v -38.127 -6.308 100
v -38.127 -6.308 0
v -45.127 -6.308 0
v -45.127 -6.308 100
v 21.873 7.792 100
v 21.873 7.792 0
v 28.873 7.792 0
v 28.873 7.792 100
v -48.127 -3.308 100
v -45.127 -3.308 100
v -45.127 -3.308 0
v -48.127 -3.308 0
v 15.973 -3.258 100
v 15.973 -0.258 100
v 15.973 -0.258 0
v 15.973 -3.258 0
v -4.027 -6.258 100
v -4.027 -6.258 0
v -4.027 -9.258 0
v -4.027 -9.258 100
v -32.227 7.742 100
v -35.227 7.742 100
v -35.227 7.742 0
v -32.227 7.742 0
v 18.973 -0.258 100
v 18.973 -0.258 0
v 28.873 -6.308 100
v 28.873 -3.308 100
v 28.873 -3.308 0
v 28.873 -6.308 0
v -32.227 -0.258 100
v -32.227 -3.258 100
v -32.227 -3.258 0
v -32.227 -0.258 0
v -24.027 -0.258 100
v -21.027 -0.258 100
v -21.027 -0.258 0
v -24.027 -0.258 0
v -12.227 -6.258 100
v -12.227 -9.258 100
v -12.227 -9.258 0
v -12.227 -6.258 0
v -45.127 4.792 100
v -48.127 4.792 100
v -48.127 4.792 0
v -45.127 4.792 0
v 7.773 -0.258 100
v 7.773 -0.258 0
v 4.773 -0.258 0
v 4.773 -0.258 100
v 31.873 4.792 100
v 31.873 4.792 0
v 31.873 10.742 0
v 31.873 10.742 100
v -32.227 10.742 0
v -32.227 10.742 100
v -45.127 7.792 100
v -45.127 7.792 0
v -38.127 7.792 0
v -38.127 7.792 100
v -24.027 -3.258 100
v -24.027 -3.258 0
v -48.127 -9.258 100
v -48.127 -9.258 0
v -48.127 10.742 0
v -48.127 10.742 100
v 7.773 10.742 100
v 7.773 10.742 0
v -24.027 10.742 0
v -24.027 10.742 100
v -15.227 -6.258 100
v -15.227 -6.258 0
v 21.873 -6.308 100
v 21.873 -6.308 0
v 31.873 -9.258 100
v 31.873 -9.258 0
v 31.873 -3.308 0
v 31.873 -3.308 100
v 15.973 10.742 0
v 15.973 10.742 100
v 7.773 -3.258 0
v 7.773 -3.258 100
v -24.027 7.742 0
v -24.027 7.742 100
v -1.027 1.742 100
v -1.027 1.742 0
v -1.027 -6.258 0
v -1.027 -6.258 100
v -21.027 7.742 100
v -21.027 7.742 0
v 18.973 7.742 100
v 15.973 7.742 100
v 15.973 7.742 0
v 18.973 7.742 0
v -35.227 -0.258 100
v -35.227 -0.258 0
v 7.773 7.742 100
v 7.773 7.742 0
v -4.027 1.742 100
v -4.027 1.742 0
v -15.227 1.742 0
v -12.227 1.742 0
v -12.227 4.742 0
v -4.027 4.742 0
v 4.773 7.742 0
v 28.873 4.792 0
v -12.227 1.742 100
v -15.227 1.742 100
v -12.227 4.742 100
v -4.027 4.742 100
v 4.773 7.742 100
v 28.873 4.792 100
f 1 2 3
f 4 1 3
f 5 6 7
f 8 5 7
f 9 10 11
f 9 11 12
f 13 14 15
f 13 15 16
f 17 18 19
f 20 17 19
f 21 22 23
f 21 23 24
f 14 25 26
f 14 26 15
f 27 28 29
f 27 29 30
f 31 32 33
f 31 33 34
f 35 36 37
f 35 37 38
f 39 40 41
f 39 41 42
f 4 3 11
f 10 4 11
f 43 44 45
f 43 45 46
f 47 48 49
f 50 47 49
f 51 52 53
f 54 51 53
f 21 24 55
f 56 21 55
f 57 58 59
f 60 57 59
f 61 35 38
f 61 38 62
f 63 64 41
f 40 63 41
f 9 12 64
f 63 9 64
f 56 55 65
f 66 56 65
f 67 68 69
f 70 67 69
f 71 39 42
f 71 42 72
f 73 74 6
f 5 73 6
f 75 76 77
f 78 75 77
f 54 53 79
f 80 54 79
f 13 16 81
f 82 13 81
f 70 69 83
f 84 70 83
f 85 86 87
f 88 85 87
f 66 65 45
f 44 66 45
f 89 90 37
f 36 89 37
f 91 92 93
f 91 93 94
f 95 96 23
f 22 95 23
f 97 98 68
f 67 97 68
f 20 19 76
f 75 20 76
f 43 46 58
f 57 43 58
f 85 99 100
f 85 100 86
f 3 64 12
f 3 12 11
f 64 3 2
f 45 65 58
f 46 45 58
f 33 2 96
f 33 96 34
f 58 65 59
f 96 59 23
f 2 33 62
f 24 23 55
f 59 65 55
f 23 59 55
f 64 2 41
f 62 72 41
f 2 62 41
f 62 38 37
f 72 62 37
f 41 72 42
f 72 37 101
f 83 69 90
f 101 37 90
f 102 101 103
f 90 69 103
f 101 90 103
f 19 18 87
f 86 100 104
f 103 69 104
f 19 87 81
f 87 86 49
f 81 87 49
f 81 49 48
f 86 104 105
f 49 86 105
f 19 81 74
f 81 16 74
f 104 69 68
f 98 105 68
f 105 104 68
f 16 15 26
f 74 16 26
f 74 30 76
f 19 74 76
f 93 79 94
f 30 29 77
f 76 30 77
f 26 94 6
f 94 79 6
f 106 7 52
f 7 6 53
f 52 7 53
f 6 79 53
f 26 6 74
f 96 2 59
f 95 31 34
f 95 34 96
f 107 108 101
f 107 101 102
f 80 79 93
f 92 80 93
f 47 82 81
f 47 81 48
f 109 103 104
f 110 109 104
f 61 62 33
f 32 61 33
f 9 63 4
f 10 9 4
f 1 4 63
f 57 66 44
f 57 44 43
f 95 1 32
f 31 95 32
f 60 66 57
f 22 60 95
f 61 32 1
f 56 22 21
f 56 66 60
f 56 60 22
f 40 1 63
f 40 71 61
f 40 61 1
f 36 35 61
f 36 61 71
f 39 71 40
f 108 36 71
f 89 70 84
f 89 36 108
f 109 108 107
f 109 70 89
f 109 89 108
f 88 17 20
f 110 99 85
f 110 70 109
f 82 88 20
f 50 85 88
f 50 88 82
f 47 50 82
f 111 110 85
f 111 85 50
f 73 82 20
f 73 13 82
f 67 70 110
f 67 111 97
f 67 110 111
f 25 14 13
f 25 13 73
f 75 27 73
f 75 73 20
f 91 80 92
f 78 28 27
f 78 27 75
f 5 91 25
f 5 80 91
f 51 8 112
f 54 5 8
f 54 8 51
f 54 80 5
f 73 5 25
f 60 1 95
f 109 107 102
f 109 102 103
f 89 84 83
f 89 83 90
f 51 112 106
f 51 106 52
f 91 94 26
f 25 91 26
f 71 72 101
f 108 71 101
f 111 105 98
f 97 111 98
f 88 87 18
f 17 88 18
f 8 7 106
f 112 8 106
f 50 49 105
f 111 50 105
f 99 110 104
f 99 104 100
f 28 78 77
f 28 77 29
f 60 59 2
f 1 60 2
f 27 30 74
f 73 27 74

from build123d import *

# Parameters (mm, degrees)
EXTRUDE_1_DEPTH = 100


with BuildPart() as part:
    # 草图1 → 凸台-拉伸1 (new body)
    with BuildSketch(Plane.XY):
        Polygon((-12.227051006, -6.257565337), (-15.227051006, -6.257565337), (-15.227051006, 1.742434663), (-12.227051006, 1.742434663), (-12.227051006, 4.742434663), (-4.027051006, 4.742434663), (-4.027051006, 1.742434663), (-1.027051006, 1.742434663), (-1.027051006, -6.257565337), (-4.027051006, -6.257565337), (-4.027051006, -9.257565337), (31.872948994, -9.257565337), (31.872948994, -3.307565337), (28.872948994, -3.307565337), (28.872948994, -6.307565337), (21.872948994, -6.307565337), (21.872948994, 7.792434663), (28.872948994, 7.792434663), (28.872948994, 4.792434663), (31.872948994, 4.792434663), (31.872948994, 10.742434663), (15.972948994, 10.742434663), (15.972948994, 7.742434663), (18.972948994, 7.742434663), (18.972948994, -0.257565337), (15.972948994, -0.257565337), (15.972948994, -3.257565337), (7.772948994, -3.257565337), (7.772948994, -0.257565337), (4.772948994, -0.257565337), (4.772948994, 7.742434663), (7.772948994, 7.742434663), (7.772948994, 10.742434663), (-24.027051006, 10.742434663), (-24.027051006, 7.742434663), (-21.027051006, 7.742434663), (-21.027051006, -0.257565337), (-24.027051006, -0.257565337), (-24.027051006, -3.257565337), (-32.227051006, -3.257565337), (-32.227051006, -0.257565337), (-35.227051006, -0.257565337), (-35.227051006, 7.742434663), (-32.227051006, 7.742434663), (-32.227051006, 10.742434663), (-48.127051006, 10.742434663), (-48.127051006, 4.792434663), (-45.127051006, 4.792434663), (-45.127051006, 7.792434663), (-38.127051006, 7.792434663), (-38.127051006, -6.307565337), (-45.127051006, -6.307565337), (-45.127051006, -3.307565337), (-48.127051006, -3.307565337), (-48.127051006, -9.257565337), (-12.227051006, -9.257565337), align=None)
    extrude(amount=EXTRUDE_1_DEPTH)


solid = part.part
